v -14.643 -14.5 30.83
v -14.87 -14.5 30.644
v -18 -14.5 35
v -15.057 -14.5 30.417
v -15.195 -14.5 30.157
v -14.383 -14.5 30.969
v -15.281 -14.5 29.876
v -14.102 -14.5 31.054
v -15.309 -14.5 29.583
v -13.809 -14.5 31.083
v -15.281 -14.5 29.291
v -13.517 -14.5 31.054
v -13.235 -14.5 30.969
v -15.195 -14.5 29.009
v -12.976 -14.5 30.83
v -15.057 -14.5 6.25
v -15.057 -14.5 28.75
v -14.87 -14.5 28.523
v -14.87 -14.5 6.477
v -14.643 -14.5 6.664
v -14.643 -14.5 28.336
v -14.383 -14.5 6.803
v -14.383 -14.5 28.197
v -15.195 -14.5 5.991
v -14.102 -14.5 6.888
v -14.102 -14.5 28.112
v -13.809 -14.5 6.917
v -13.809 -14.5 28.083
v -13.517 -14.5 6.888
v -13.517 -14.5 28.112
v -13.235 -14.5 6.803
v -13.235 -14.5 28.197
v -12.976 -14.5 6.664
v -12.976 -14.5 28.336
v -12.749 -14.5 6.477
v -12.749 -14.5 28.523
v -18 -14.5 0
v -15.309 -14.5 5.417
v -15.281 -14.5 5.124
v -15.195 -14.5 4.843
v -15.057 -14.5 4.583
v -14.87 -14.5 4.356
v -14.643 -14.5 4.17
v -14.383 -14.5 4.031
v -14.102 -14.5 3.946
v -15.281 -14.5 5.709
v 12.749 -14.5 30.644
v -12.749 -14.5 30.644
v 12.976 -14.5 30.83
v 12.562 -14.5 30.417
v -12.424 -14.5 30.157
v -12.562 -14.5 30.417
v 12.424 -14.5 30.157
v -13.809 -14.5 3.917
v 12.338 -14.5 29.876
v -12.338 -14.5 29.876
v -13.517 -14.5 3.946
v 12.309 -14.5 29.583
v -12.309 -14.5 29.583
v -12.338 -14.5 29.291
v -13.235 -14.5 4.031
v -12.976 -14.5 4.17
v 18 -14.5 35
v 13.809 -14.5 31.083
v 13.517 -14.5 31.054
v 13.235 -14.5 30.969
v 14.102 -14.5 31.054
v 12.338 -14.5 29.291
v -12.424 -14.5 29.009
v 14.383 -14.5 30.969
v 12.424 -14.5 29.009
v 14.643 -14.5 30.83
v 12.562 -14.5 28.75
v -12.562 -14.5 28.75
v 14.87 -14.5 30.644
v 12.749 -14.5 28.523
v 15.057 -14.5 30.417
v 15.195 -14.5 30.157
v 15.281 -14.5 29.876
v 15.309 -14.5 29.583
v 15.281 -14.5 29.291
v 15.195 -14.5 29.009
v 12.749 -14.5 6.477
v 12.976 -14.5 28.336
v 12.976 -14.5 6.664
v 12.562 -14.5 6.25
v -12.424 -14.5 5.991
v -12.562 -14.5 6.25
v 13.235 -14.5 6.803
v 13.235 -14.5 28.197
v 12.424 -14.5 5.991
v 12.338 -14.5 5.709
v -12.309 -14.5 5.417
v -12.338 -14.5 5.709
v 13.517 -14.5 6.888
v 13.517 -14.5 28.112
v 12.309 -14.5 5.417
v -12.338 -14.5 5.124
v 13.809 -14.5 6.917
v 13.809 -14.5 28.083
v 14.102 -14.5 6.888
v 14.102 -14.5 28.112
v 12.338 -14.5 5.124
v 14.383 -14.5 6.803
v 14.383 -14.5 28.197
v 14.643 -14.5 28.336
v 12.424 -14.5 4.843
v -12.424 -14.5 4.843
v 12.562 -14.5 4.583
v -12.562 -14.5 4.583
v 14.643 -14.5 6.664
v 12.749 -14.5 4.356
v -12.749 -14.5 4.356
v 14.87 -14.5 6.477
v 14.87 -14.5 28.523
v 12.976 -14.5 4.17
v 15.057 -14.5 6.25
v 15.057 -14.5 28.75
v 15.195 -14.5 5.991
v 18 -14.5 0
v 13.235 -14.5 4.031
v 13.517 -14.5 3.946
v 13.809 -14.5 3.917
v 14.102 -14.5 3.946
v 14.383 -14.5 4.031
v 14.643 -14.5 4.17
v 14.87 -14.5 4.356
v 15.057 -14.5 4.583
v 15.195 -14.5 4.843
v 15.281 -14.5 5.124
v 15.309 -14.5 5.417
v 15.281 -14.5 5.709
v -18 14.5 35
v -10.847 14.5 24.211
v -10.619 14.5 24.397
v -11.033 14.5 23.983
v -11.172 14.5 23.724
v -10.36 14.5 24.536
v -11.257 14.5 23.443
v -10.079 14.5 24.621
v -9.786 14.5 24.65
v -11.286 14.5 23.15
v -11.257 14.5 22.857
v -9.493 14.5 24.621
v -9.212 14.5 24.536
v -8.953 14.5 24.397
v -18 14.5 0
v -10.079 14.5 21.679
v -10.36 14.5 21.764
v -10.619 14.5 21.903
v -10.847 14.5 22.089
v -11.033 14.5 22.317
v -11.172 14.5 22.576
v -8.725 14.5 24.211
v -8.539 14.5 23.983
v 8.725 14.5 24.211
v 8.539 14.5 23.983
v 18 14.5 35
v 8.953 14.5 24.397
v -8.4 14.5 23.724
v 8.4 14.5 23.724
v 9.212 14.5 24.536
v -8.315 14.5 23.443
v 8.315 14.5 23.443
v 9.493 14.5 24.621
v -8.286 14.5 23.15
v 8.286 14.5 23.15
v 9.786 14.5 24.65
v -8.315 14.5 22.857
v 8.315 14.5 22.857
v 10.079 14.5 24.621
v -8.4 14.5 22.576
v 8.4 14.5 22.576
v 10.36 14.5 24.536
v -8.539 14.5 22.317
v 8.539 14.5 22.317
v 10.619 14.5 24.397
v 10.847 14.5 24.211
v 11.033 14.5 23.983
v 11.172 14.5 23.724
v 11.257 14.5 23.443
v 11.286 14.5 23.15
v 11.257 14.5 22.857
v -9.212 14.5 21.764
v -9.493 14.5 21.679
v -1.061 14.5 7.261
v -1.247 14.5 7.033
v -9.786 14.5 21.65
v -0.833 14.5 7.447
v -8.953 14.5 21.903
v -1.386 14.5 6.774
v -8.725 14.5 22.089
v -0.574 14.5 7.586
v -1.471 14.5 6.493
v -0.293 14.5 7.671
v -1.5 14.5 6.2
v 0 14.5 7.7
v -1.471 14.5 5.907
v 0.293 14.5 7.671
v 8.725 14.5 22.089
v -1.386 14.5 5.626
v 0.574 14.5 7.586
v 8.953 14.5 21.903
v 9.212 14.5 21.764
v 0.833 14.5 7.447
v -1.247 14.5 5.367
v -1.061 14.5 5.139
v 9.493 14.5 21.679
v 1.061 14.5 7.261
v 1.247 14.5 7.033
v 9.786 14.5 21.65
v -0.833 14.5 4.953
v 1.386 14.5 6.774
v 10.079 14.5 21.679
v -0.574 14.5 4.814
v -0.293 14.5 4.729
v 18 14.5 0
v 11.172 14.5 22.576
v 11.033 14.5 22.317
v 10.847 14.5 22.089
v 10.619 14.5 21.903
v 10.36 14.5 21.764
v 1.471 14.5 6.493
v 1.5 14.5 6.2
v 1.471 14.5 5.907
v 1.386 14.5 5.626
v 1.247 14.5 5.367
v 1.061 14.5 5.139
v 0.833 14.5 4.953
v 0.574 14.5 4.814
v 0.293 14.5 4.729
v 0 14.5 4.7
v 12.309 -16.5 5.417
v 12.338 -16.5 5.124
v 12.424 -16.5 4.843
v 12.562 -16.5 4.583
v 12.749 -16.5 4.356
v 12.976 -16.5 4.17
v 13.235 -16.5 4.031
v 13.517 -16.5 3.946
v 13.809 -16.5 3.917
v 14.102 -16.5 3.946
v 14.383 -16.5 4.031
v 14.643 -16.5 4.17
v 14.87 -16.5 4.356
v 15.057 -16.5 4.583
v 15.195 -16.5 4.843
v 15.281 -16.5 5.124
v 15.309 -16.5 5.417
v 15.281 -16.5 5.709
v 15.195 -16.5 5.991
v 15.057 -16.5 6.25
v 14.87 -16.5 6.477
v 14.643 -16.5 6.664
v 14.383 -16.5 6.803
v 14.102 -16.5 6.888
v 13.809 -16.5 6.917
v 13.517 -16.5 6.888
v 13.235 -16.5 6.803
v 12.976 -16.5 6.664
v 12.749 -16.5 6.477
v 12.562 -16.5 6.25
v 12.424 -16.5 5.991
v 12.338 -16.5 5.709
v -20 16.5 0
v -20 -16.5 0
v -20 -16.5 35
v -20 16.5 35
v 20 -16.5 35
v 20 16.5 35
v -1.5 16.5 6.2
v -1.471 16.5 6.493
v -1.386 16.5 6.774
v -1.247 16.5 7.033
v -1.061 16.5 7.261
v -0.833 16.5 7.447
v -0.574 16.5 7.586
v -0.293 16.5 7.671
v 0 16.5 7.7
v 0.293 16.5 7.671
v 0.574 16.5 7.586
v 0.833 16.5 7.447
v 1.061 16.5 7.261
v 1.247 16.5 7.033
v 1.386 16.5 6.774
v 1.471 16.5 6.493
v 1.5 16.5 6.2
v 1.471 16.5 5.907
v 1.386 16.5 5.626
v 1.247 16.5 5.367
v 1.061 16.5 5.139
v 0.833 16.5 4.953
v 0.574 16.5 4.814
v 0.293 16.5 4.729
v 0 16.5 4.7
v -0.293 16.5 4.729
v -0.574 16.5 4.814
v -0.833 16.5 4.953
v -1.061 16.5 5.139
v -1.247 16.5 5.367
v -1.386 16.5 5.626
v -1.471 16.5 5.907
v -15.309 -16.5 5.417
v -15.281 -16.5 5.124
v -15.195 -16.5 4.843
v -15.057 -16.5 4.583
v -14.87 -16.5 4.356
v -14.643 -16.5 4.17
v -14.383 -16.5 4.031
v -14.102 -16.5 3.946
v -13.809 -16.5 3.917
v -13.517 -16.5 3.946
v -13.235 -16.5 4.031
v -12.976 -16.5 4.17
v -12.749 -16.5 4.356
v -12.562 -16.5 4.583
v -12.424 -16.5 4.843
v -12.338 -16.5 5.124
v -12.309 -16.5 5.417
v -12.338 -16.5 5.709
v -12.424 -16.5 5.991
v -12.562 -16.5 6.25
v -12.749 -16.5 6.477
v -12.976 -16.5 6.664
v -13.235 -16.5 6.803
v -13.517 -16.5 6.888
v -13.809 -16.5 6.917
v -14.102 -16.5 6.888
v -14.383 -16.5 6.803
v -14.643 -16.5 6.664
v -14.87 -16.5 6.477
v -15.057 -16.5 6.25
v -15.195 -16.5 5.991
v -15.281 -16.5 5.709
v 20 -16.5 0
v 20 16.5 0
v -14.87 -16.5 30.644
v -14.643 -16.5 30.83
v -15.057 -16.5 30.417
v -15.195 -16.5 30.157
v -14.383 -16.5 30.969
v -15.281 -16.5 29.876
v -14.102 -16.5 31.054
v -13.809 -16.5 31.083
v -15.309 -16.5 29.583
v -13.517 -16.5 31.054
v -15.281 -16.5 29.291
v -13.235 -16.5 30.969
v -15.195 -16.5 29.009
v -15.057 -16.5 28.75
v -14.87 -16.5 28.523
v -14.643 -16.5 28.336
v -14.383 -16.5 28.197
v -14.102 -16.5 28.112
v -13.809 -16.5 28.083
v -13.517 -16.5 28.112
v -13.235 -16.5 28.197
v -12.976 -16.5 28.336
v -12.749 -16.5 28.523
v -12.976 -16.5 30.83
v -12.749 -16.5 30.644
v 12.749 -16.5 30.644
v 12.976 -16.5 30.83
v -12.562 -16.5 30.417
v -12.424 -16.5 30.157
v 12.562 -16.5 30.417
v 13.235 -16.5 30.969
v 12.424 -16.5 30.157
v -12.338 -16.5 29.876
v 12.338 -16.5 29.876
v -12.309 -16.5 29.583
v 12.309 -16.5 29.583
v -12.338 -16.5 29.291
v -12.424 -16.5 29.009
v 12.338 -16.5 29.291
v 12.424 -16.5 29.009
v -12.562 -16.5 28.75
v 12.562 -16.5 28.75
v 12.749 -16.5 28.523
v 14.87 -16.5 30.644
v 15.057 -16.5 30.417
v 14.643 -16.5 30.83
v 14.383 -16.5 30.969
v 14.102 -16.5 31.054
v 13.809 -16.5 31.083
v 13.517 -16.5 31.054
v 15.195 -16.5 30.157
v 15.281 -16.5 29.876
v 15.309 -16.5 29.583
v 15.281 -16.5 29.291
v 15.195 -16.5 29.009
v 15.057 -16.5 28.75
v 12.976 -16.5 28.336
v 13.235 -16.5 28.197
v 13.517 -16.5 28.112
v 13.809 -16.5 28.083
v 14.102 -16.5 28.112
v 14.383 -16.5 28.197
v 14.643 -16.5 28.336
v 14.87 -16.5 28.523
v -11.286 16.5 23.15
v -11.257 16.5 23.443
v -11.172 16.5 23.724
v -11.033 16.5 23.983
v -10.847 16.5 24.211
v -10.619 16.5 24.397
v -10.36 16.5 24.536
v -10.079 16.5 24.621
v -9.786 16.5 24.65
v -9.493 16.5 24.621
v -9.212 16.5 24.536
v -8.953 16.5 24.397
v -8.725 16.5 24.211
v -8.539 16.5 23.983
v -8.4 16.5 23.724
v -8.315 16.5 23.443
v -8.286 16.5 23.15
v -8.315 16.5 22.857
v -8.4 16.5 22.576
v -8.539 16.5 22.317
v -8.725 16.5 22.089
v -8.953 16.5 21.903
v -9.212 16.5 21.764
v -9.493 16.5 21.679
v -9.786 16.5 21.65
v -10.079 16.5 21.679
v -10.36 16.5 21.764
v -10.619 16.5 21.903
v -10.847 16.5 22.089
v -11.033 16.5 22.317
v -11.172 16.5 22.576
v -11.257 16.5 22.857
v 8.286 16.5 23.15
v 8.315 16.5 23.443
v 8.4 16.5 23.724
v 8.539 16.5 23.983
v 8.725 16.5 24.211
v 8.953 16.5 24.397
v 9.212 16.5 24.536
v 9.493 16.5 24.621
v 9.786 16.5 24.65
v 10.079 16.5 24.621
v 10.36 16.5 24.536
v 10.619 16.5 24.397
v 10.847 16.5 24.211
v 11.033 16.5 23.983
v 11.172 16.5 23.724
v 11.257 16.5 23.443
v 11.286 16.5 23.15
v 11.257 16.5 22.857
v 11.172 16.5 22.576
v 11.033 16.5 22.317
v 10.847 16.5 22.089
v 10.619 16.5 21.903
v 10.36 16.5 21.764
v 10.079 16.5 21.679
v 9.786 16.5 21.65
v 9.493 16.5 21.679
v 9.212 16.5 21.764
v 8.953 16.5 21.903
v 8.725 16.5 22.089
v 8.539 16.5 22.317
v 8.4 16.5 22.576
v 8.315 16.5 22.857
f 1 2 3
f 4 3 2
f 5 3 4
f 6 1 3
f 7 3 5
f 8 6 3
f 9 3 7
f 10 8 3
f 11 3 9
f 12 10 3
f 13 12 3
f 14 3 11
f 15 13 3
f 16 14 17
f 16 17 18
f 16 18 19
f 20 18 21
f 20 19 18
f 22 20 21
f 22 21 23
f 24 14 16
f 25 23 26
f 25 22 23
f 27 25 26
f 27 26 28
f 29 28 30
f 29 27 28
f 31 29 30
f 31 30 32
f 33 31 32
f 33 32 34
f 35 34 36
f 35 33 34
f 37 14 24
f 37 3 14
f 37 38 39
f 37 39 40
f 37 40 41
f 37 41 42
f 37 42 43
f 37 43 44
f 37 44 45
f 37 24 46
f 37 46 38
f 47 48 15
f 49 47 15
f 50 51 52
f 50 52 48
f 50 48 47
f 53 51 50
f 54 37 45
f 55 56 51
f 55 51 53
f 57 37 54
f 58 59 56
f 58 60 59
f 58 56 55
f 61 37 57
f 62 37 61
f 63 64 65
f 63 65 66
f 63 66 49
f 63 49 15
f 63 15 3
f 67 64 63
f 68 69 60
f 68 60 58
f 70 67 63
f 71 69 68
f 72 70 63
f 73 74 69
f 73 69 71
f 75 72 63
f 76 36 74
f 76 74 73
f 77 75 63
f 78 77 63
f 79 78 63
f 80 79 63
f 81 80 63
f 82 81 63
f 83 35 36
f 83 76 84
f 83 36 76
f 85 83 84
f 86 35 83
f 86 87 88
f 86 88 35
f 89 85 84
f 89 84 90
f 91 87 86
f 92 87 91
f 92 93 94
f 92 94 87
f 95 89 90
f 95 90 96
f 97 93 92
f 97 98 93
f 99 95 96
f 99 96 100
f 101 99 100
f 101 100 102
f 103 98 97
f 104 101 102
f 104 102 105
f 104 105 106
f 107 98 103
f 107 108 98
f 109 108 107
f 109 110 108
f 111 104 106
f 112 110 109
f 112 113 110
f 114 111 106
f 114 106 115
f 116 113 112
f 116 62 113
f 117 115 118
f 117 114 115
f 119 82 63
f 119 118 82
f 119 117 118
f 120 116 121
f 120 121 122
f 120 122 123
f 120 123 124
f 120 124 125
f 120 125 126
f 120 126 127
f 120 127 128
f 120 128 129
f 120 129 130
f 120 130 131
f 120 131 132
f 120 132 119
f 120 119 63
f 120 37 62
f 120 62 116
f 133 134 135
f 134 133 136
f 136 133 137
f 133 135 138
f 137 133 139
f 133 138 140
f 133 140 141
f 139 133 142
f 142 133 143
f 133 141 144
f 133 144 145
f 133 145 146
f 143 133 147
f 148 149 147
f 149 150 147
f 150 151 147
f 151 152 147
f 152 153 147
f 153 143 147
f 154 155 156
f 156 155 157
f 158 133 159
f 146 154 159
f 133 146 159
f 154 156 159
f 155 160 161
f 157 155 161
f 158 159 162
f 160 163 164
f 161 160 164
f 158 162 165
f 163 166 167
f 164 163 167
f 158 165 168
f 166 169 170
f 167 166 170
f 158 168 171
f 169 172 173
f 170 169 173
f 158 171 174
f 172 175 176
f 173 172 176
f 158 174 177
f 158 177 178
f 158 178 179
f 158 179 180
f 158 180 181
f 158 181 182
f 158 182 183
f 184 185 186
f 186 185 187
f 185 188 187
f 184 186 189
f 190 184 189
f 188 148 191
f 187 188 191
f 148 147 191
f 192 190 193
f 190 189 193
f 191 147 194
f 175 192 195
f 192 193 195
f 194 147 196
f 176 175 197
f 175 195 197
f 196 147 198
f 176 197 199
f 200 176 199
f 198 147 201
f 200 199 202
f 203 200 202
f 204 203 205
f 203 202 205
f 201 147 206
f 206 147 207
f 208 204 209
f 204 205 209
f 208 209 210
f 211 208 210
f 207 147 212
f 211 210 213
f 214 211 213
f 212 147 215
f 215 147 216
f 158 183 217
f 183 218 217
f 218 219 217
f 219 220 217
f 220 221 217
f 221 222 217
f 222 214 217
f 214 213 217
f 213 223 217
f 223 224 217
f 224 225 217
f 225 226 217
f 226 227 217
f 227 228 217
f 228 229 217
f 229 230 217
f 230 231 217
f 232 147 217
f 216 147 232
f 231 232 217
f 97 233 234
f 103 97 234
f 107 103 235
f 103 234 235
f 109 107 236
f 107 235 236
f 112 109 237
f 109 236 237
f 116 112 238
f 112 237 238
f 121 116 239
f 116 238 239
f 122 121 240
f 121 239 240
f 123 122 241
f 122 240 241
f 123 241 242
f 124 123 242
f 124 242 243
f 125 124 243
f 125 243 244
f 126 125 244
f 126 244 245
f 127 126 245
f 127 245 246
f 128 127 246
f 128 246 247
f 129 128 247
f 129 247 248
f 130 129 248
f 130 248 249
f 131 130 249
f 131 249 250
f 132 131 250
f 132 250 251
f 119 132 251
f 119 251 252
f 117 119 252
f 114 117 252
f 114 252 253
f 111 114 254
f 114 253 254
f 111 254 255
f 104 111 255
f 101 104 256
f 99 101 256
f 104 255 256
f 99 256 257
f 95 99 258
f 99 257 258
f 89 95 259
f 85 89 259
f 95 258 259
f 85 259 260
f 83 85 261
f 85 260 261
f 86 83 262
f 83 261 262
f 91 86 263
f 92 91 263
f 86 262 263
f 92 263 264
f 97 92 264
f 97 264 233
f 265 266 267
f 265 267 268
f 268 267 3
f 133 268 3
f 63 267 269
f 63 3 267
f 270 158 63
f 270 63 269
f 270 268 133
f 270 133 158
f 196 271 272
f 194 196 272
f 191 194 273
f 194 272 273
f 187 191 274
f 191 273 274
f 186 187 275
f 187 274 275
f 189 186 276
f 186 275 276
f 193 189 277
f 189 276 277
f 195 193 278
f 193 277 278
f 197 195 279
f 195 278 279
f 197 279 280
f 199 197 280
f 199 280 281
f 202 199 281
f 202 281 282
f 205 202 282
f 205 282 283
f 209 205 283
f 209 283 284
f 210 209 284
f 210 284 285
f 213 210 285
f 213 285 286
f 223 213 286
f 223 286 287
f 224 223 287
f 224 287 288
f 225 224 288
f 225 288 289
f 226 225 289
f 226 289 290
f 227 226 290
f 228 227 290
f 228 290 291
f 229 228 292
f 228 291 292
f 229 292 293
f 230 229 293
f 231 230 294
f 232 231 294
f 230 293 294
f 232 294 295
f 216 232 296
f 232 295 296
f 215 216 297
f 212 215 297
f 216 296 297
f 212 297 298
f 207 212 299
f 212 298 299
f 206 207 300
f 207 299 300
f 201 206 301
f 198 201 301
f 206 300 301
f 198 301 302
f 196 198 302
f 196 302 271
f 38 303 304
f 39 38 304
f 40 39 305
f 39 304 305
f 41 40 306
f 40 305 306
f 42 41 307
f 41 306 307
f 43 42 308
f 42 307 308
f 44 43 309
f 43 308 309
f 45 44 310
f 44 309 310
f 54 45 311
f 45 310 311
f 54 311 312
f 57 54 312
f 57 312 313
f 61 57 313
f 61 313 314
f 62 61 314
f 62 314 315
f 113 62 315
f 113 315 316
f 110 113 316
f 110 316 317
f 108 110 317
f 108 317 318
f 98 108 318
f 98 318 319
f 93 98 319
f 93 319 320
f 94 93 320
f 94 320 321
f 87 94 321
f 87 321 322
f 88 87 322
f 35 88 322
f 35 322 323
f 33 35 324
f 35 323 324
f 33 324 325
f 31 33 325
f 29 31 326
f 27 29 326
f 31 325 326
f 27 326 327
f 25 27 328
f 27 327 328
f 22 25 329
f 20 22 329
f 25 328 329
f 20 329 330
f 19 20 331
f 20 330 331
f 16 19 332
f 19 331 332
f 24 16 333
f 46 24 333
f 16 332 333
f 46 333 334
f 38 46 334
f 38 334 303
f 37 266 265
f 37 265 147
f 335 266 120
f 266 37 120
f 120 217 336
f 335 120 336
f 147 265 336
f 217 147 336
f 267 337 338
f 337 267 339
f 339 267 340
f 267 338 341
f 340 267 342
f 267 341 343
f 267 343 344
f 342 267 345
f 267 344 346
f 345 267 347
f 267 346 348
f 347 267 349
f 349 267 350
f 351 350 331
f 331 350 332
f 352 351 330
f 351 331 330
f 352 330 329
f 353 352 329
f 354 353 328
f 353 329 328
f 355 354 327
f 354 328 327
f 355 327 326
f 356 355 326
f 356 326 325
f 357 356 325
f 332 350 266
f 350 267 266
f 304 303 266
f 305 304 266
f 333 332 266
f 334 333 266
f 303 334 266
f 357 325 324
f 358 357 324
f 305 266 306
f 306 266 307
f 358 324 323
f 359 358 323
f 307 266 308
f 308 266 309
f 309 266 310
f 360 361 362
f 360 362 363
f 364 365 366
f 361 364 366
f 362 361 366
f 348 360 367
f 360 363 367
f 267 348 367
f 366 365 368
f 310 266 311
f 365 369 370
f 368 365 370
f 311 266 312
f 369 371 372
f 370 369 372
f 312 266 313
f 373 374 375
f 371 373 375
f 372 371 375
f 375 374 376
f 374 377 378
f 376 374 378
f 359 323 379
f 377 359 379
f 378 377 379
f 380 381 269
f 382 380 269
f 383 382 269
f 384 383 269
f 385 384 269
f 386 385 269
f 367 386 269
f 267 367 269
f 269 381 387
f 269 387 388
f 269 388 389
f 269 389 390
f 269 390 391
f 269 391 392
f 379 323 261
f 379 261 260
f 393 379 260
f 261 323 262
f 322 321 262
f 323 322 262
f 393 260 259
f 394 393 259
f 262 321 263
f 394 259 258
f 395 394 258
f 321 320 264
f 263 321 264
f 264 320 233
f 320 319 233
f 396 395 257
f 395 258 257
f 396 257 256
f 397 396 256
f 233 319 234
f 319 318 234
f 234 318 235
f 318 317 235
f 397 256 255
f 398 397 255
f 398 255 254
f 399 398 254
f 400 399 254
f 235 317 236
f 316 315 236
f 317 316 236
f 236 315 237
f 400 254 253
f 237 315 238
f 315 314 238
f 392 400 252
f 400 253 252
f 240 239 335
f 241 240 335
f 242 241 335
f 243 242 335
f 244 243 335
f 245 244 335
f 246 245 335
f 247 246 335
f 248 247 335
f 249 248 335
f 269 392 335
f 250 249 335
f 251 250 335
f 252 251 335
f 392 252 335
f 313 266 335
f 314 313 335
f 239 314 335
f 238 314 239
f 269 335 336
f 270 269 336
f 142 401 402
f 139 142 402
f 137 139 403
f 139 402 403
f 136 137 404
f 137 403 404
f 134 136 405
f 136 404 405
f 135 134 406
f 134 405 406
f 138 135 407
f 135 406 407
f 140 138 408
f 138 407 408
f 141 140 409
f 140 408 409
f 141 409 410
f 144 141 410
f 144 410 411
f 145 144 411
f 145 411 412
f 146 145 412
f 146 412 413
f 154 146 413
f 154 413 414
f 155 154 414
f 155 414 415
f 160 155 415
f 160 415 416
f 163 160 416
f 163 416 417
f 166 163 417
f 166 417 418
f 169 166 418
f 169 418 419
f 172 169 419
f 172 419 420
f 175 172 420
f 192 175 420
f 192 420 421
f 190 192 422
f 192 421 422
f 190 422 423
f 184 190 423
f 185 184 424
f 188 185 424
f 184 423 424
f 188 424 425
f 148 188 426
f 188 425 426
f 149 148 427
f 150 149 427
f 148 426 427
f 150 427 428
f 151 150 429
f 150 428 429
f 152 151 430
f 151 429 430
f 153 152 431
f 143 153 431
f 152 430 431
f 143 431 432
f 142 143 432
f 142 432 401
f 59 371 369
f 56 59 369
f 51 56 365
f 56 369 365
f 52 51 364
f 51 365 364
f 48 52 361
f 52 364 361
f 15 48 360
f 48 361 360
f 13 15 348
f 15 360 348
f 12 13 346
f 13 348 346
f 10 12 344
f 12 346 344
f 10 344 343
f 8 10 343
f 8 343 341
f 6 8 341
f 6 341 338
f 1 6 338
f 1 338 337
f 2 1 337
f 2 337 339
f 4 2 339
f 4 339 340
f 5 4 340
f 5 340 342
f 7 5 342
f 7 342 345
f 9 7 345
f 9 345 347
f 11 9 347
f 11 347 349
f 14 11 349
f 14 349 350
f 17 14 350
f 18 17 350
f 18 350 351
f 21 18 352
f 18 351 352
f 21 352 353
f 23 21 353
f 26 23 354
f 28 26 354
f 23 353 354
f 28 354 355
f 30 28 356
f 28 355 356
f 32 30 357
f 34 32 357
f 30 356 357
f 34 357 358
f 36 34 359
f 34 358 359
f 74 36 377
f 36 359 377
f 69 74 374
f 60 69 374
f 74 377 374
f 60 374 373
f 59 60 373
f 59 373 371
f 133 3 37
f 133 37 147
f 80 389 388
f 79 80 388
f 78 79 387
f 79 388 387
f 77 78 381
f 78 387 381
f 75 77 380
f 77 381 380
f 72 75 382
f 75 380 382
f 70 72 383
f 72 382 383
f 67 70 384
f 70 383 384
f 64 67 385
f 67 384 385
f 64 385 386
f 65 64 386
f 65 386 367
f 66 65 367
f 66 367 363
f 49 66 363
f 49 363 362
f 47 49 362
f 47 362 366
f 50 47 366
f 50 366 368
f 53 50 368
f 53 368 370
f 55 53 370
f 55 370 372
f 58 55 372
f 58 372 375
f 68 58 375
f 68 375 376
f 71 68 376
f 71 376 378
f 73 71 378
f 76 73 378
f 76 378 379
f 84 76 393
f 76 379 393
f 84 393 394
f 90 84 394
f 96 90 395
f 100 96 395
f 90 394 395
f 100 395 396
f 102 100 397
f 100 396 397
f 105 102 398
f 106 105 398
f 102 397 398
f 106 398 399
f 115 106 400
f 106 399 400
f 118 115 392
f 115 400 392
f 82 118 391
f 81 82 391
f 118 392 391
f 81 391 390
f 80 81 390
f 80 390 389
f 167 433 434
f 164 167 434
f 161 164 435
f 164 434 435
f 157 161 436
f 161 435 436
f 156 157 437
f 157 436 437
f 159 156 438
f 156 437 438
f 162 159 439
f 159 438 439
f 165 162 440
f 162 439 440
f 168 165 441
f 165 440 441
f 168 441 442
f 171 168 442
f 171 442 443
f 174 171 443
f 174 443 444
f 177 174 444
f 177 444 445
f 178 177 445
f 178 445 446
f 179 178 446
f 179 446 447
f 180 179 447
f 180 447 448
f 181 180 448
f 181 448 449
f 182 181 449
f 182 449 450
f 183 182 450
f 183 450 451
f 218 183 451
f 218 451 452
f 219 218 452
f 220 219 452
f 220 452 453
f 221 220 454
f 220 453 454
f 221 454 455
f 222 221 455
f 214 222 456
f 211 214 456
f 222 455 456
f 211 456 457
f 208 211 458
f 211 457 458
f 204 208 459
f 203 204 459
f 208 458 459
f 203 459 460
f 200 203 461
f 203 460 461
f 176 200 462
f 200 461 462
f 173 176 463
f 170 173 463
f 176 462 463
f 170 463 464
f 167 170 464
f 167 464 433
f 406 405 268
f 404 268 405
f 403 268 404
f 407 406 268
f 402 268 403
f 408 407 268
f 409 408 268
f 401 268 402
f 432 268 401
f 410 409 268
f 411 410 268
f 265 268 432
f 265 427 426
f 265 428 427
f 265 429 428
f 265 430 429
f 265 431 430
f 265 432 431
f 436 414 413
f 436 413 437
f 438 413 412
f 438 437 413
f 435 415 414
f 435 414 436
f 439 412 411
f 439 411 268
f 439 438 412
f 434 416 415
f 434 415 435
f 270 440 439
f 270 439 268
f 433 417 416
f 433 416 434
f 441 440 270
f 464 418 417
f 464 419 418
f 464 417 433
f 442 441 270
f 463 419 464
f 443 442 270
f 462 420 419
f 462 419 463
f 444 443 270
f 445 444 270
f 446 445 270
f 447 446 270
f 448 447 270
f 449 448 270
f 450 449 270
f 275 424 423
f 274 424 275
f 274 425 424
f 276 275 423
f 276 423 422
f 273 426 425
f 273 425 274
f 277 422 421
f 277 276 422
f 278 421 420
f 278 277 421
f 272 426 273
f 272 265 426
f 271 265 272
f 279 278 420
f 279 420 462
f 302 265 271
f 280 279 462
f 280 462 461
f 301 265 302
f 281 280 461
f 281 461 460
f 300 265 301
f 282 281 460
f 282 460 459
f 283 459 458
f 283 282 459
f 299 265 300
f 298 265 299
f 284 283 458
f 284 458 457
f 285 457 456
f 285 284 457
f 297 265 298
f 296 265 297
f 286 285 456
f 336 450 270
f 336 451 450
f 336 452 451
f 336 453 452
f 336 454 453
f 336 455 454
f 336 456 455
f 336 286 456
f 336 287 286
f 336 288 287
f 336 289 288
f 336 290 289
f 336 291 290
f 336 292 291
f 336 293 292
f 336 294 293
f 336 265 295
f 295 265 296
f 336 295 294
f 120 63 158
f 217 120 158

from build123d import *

# Parameters (mm, degrees)
SKETCH1_W           = 40
SKETCH1_H           = 33
SKETCH1_W_2         = 36
SKETCH1_H_2         = 29
BOSS_EXTRUDE1_DEPTH = 35
SKETCH2_R           = 1.5
CUT_EXTRUDE1_DEPTH  = 15
SKETCH3_R           = 1.5
CUT_EXTRUDE2_DEPTH  = 15


with BuildPart() as part:
    # Sketch1 → Boss-Extrude1 (new body)
    with BuildSketch(Plane.XY):
        Rectangle(SKETCH1_W, SKETCH1_H)
        Rectangle(SKETCH1_W_2, SKETCH1_H_2, mode=Mode.SUBTRACT)
    extrude(amount=BOSS_EXTRUDE1_DEPTH)

    # Sketch2 → Cut-Extrude1 (cut)
    with BuildSketch(Plane(origin=(0, 16.5, 0), x_dir=(1, 0, 0), z_dir=(0, 1, 0))):
        with Locations(Location((0, -6.2, 0), (0, 0, 180))):
            Circle(SKETCH2_R)
        with Locations(Location((9.786087063, -23.15, 0), (0, 0, 180))):
            Circle(SKETCH2_R)
        with Locations(Location((-9.786087063, -23.15, 0), (0, 0, 180))):
            Circle(SKETCH2_R)
    extrude(amount=-CUT_EXTRUDE1_DEPTH, mode=Mode.SUBTRACT)

    # Sketch3 → Cut-Extrude2 (cut)
    with BuildSketch(Plane.XZ.offset(16.5)):
        with Locations((13.809468579, 29.583285006)):
            Circle(SKETCH3_R)
        with Locations((-13.809468579, 29.583285006)):
            Circle(SKETCH3_R)
        with Locations(Location((13.809468579, 5.416714994, 0), (0, 0, 180))):
            Circle(SKETCH3_R)
        with Locations(Location((-13.809468579, 5.416714994, 0), (0, 0, 180))):
            Circle(SKETCH3_R)
    extrude(amount=-CUT_EXTRUDE2_DEPTH, mode=Mode.SUBTRACT)


solid = part.part
